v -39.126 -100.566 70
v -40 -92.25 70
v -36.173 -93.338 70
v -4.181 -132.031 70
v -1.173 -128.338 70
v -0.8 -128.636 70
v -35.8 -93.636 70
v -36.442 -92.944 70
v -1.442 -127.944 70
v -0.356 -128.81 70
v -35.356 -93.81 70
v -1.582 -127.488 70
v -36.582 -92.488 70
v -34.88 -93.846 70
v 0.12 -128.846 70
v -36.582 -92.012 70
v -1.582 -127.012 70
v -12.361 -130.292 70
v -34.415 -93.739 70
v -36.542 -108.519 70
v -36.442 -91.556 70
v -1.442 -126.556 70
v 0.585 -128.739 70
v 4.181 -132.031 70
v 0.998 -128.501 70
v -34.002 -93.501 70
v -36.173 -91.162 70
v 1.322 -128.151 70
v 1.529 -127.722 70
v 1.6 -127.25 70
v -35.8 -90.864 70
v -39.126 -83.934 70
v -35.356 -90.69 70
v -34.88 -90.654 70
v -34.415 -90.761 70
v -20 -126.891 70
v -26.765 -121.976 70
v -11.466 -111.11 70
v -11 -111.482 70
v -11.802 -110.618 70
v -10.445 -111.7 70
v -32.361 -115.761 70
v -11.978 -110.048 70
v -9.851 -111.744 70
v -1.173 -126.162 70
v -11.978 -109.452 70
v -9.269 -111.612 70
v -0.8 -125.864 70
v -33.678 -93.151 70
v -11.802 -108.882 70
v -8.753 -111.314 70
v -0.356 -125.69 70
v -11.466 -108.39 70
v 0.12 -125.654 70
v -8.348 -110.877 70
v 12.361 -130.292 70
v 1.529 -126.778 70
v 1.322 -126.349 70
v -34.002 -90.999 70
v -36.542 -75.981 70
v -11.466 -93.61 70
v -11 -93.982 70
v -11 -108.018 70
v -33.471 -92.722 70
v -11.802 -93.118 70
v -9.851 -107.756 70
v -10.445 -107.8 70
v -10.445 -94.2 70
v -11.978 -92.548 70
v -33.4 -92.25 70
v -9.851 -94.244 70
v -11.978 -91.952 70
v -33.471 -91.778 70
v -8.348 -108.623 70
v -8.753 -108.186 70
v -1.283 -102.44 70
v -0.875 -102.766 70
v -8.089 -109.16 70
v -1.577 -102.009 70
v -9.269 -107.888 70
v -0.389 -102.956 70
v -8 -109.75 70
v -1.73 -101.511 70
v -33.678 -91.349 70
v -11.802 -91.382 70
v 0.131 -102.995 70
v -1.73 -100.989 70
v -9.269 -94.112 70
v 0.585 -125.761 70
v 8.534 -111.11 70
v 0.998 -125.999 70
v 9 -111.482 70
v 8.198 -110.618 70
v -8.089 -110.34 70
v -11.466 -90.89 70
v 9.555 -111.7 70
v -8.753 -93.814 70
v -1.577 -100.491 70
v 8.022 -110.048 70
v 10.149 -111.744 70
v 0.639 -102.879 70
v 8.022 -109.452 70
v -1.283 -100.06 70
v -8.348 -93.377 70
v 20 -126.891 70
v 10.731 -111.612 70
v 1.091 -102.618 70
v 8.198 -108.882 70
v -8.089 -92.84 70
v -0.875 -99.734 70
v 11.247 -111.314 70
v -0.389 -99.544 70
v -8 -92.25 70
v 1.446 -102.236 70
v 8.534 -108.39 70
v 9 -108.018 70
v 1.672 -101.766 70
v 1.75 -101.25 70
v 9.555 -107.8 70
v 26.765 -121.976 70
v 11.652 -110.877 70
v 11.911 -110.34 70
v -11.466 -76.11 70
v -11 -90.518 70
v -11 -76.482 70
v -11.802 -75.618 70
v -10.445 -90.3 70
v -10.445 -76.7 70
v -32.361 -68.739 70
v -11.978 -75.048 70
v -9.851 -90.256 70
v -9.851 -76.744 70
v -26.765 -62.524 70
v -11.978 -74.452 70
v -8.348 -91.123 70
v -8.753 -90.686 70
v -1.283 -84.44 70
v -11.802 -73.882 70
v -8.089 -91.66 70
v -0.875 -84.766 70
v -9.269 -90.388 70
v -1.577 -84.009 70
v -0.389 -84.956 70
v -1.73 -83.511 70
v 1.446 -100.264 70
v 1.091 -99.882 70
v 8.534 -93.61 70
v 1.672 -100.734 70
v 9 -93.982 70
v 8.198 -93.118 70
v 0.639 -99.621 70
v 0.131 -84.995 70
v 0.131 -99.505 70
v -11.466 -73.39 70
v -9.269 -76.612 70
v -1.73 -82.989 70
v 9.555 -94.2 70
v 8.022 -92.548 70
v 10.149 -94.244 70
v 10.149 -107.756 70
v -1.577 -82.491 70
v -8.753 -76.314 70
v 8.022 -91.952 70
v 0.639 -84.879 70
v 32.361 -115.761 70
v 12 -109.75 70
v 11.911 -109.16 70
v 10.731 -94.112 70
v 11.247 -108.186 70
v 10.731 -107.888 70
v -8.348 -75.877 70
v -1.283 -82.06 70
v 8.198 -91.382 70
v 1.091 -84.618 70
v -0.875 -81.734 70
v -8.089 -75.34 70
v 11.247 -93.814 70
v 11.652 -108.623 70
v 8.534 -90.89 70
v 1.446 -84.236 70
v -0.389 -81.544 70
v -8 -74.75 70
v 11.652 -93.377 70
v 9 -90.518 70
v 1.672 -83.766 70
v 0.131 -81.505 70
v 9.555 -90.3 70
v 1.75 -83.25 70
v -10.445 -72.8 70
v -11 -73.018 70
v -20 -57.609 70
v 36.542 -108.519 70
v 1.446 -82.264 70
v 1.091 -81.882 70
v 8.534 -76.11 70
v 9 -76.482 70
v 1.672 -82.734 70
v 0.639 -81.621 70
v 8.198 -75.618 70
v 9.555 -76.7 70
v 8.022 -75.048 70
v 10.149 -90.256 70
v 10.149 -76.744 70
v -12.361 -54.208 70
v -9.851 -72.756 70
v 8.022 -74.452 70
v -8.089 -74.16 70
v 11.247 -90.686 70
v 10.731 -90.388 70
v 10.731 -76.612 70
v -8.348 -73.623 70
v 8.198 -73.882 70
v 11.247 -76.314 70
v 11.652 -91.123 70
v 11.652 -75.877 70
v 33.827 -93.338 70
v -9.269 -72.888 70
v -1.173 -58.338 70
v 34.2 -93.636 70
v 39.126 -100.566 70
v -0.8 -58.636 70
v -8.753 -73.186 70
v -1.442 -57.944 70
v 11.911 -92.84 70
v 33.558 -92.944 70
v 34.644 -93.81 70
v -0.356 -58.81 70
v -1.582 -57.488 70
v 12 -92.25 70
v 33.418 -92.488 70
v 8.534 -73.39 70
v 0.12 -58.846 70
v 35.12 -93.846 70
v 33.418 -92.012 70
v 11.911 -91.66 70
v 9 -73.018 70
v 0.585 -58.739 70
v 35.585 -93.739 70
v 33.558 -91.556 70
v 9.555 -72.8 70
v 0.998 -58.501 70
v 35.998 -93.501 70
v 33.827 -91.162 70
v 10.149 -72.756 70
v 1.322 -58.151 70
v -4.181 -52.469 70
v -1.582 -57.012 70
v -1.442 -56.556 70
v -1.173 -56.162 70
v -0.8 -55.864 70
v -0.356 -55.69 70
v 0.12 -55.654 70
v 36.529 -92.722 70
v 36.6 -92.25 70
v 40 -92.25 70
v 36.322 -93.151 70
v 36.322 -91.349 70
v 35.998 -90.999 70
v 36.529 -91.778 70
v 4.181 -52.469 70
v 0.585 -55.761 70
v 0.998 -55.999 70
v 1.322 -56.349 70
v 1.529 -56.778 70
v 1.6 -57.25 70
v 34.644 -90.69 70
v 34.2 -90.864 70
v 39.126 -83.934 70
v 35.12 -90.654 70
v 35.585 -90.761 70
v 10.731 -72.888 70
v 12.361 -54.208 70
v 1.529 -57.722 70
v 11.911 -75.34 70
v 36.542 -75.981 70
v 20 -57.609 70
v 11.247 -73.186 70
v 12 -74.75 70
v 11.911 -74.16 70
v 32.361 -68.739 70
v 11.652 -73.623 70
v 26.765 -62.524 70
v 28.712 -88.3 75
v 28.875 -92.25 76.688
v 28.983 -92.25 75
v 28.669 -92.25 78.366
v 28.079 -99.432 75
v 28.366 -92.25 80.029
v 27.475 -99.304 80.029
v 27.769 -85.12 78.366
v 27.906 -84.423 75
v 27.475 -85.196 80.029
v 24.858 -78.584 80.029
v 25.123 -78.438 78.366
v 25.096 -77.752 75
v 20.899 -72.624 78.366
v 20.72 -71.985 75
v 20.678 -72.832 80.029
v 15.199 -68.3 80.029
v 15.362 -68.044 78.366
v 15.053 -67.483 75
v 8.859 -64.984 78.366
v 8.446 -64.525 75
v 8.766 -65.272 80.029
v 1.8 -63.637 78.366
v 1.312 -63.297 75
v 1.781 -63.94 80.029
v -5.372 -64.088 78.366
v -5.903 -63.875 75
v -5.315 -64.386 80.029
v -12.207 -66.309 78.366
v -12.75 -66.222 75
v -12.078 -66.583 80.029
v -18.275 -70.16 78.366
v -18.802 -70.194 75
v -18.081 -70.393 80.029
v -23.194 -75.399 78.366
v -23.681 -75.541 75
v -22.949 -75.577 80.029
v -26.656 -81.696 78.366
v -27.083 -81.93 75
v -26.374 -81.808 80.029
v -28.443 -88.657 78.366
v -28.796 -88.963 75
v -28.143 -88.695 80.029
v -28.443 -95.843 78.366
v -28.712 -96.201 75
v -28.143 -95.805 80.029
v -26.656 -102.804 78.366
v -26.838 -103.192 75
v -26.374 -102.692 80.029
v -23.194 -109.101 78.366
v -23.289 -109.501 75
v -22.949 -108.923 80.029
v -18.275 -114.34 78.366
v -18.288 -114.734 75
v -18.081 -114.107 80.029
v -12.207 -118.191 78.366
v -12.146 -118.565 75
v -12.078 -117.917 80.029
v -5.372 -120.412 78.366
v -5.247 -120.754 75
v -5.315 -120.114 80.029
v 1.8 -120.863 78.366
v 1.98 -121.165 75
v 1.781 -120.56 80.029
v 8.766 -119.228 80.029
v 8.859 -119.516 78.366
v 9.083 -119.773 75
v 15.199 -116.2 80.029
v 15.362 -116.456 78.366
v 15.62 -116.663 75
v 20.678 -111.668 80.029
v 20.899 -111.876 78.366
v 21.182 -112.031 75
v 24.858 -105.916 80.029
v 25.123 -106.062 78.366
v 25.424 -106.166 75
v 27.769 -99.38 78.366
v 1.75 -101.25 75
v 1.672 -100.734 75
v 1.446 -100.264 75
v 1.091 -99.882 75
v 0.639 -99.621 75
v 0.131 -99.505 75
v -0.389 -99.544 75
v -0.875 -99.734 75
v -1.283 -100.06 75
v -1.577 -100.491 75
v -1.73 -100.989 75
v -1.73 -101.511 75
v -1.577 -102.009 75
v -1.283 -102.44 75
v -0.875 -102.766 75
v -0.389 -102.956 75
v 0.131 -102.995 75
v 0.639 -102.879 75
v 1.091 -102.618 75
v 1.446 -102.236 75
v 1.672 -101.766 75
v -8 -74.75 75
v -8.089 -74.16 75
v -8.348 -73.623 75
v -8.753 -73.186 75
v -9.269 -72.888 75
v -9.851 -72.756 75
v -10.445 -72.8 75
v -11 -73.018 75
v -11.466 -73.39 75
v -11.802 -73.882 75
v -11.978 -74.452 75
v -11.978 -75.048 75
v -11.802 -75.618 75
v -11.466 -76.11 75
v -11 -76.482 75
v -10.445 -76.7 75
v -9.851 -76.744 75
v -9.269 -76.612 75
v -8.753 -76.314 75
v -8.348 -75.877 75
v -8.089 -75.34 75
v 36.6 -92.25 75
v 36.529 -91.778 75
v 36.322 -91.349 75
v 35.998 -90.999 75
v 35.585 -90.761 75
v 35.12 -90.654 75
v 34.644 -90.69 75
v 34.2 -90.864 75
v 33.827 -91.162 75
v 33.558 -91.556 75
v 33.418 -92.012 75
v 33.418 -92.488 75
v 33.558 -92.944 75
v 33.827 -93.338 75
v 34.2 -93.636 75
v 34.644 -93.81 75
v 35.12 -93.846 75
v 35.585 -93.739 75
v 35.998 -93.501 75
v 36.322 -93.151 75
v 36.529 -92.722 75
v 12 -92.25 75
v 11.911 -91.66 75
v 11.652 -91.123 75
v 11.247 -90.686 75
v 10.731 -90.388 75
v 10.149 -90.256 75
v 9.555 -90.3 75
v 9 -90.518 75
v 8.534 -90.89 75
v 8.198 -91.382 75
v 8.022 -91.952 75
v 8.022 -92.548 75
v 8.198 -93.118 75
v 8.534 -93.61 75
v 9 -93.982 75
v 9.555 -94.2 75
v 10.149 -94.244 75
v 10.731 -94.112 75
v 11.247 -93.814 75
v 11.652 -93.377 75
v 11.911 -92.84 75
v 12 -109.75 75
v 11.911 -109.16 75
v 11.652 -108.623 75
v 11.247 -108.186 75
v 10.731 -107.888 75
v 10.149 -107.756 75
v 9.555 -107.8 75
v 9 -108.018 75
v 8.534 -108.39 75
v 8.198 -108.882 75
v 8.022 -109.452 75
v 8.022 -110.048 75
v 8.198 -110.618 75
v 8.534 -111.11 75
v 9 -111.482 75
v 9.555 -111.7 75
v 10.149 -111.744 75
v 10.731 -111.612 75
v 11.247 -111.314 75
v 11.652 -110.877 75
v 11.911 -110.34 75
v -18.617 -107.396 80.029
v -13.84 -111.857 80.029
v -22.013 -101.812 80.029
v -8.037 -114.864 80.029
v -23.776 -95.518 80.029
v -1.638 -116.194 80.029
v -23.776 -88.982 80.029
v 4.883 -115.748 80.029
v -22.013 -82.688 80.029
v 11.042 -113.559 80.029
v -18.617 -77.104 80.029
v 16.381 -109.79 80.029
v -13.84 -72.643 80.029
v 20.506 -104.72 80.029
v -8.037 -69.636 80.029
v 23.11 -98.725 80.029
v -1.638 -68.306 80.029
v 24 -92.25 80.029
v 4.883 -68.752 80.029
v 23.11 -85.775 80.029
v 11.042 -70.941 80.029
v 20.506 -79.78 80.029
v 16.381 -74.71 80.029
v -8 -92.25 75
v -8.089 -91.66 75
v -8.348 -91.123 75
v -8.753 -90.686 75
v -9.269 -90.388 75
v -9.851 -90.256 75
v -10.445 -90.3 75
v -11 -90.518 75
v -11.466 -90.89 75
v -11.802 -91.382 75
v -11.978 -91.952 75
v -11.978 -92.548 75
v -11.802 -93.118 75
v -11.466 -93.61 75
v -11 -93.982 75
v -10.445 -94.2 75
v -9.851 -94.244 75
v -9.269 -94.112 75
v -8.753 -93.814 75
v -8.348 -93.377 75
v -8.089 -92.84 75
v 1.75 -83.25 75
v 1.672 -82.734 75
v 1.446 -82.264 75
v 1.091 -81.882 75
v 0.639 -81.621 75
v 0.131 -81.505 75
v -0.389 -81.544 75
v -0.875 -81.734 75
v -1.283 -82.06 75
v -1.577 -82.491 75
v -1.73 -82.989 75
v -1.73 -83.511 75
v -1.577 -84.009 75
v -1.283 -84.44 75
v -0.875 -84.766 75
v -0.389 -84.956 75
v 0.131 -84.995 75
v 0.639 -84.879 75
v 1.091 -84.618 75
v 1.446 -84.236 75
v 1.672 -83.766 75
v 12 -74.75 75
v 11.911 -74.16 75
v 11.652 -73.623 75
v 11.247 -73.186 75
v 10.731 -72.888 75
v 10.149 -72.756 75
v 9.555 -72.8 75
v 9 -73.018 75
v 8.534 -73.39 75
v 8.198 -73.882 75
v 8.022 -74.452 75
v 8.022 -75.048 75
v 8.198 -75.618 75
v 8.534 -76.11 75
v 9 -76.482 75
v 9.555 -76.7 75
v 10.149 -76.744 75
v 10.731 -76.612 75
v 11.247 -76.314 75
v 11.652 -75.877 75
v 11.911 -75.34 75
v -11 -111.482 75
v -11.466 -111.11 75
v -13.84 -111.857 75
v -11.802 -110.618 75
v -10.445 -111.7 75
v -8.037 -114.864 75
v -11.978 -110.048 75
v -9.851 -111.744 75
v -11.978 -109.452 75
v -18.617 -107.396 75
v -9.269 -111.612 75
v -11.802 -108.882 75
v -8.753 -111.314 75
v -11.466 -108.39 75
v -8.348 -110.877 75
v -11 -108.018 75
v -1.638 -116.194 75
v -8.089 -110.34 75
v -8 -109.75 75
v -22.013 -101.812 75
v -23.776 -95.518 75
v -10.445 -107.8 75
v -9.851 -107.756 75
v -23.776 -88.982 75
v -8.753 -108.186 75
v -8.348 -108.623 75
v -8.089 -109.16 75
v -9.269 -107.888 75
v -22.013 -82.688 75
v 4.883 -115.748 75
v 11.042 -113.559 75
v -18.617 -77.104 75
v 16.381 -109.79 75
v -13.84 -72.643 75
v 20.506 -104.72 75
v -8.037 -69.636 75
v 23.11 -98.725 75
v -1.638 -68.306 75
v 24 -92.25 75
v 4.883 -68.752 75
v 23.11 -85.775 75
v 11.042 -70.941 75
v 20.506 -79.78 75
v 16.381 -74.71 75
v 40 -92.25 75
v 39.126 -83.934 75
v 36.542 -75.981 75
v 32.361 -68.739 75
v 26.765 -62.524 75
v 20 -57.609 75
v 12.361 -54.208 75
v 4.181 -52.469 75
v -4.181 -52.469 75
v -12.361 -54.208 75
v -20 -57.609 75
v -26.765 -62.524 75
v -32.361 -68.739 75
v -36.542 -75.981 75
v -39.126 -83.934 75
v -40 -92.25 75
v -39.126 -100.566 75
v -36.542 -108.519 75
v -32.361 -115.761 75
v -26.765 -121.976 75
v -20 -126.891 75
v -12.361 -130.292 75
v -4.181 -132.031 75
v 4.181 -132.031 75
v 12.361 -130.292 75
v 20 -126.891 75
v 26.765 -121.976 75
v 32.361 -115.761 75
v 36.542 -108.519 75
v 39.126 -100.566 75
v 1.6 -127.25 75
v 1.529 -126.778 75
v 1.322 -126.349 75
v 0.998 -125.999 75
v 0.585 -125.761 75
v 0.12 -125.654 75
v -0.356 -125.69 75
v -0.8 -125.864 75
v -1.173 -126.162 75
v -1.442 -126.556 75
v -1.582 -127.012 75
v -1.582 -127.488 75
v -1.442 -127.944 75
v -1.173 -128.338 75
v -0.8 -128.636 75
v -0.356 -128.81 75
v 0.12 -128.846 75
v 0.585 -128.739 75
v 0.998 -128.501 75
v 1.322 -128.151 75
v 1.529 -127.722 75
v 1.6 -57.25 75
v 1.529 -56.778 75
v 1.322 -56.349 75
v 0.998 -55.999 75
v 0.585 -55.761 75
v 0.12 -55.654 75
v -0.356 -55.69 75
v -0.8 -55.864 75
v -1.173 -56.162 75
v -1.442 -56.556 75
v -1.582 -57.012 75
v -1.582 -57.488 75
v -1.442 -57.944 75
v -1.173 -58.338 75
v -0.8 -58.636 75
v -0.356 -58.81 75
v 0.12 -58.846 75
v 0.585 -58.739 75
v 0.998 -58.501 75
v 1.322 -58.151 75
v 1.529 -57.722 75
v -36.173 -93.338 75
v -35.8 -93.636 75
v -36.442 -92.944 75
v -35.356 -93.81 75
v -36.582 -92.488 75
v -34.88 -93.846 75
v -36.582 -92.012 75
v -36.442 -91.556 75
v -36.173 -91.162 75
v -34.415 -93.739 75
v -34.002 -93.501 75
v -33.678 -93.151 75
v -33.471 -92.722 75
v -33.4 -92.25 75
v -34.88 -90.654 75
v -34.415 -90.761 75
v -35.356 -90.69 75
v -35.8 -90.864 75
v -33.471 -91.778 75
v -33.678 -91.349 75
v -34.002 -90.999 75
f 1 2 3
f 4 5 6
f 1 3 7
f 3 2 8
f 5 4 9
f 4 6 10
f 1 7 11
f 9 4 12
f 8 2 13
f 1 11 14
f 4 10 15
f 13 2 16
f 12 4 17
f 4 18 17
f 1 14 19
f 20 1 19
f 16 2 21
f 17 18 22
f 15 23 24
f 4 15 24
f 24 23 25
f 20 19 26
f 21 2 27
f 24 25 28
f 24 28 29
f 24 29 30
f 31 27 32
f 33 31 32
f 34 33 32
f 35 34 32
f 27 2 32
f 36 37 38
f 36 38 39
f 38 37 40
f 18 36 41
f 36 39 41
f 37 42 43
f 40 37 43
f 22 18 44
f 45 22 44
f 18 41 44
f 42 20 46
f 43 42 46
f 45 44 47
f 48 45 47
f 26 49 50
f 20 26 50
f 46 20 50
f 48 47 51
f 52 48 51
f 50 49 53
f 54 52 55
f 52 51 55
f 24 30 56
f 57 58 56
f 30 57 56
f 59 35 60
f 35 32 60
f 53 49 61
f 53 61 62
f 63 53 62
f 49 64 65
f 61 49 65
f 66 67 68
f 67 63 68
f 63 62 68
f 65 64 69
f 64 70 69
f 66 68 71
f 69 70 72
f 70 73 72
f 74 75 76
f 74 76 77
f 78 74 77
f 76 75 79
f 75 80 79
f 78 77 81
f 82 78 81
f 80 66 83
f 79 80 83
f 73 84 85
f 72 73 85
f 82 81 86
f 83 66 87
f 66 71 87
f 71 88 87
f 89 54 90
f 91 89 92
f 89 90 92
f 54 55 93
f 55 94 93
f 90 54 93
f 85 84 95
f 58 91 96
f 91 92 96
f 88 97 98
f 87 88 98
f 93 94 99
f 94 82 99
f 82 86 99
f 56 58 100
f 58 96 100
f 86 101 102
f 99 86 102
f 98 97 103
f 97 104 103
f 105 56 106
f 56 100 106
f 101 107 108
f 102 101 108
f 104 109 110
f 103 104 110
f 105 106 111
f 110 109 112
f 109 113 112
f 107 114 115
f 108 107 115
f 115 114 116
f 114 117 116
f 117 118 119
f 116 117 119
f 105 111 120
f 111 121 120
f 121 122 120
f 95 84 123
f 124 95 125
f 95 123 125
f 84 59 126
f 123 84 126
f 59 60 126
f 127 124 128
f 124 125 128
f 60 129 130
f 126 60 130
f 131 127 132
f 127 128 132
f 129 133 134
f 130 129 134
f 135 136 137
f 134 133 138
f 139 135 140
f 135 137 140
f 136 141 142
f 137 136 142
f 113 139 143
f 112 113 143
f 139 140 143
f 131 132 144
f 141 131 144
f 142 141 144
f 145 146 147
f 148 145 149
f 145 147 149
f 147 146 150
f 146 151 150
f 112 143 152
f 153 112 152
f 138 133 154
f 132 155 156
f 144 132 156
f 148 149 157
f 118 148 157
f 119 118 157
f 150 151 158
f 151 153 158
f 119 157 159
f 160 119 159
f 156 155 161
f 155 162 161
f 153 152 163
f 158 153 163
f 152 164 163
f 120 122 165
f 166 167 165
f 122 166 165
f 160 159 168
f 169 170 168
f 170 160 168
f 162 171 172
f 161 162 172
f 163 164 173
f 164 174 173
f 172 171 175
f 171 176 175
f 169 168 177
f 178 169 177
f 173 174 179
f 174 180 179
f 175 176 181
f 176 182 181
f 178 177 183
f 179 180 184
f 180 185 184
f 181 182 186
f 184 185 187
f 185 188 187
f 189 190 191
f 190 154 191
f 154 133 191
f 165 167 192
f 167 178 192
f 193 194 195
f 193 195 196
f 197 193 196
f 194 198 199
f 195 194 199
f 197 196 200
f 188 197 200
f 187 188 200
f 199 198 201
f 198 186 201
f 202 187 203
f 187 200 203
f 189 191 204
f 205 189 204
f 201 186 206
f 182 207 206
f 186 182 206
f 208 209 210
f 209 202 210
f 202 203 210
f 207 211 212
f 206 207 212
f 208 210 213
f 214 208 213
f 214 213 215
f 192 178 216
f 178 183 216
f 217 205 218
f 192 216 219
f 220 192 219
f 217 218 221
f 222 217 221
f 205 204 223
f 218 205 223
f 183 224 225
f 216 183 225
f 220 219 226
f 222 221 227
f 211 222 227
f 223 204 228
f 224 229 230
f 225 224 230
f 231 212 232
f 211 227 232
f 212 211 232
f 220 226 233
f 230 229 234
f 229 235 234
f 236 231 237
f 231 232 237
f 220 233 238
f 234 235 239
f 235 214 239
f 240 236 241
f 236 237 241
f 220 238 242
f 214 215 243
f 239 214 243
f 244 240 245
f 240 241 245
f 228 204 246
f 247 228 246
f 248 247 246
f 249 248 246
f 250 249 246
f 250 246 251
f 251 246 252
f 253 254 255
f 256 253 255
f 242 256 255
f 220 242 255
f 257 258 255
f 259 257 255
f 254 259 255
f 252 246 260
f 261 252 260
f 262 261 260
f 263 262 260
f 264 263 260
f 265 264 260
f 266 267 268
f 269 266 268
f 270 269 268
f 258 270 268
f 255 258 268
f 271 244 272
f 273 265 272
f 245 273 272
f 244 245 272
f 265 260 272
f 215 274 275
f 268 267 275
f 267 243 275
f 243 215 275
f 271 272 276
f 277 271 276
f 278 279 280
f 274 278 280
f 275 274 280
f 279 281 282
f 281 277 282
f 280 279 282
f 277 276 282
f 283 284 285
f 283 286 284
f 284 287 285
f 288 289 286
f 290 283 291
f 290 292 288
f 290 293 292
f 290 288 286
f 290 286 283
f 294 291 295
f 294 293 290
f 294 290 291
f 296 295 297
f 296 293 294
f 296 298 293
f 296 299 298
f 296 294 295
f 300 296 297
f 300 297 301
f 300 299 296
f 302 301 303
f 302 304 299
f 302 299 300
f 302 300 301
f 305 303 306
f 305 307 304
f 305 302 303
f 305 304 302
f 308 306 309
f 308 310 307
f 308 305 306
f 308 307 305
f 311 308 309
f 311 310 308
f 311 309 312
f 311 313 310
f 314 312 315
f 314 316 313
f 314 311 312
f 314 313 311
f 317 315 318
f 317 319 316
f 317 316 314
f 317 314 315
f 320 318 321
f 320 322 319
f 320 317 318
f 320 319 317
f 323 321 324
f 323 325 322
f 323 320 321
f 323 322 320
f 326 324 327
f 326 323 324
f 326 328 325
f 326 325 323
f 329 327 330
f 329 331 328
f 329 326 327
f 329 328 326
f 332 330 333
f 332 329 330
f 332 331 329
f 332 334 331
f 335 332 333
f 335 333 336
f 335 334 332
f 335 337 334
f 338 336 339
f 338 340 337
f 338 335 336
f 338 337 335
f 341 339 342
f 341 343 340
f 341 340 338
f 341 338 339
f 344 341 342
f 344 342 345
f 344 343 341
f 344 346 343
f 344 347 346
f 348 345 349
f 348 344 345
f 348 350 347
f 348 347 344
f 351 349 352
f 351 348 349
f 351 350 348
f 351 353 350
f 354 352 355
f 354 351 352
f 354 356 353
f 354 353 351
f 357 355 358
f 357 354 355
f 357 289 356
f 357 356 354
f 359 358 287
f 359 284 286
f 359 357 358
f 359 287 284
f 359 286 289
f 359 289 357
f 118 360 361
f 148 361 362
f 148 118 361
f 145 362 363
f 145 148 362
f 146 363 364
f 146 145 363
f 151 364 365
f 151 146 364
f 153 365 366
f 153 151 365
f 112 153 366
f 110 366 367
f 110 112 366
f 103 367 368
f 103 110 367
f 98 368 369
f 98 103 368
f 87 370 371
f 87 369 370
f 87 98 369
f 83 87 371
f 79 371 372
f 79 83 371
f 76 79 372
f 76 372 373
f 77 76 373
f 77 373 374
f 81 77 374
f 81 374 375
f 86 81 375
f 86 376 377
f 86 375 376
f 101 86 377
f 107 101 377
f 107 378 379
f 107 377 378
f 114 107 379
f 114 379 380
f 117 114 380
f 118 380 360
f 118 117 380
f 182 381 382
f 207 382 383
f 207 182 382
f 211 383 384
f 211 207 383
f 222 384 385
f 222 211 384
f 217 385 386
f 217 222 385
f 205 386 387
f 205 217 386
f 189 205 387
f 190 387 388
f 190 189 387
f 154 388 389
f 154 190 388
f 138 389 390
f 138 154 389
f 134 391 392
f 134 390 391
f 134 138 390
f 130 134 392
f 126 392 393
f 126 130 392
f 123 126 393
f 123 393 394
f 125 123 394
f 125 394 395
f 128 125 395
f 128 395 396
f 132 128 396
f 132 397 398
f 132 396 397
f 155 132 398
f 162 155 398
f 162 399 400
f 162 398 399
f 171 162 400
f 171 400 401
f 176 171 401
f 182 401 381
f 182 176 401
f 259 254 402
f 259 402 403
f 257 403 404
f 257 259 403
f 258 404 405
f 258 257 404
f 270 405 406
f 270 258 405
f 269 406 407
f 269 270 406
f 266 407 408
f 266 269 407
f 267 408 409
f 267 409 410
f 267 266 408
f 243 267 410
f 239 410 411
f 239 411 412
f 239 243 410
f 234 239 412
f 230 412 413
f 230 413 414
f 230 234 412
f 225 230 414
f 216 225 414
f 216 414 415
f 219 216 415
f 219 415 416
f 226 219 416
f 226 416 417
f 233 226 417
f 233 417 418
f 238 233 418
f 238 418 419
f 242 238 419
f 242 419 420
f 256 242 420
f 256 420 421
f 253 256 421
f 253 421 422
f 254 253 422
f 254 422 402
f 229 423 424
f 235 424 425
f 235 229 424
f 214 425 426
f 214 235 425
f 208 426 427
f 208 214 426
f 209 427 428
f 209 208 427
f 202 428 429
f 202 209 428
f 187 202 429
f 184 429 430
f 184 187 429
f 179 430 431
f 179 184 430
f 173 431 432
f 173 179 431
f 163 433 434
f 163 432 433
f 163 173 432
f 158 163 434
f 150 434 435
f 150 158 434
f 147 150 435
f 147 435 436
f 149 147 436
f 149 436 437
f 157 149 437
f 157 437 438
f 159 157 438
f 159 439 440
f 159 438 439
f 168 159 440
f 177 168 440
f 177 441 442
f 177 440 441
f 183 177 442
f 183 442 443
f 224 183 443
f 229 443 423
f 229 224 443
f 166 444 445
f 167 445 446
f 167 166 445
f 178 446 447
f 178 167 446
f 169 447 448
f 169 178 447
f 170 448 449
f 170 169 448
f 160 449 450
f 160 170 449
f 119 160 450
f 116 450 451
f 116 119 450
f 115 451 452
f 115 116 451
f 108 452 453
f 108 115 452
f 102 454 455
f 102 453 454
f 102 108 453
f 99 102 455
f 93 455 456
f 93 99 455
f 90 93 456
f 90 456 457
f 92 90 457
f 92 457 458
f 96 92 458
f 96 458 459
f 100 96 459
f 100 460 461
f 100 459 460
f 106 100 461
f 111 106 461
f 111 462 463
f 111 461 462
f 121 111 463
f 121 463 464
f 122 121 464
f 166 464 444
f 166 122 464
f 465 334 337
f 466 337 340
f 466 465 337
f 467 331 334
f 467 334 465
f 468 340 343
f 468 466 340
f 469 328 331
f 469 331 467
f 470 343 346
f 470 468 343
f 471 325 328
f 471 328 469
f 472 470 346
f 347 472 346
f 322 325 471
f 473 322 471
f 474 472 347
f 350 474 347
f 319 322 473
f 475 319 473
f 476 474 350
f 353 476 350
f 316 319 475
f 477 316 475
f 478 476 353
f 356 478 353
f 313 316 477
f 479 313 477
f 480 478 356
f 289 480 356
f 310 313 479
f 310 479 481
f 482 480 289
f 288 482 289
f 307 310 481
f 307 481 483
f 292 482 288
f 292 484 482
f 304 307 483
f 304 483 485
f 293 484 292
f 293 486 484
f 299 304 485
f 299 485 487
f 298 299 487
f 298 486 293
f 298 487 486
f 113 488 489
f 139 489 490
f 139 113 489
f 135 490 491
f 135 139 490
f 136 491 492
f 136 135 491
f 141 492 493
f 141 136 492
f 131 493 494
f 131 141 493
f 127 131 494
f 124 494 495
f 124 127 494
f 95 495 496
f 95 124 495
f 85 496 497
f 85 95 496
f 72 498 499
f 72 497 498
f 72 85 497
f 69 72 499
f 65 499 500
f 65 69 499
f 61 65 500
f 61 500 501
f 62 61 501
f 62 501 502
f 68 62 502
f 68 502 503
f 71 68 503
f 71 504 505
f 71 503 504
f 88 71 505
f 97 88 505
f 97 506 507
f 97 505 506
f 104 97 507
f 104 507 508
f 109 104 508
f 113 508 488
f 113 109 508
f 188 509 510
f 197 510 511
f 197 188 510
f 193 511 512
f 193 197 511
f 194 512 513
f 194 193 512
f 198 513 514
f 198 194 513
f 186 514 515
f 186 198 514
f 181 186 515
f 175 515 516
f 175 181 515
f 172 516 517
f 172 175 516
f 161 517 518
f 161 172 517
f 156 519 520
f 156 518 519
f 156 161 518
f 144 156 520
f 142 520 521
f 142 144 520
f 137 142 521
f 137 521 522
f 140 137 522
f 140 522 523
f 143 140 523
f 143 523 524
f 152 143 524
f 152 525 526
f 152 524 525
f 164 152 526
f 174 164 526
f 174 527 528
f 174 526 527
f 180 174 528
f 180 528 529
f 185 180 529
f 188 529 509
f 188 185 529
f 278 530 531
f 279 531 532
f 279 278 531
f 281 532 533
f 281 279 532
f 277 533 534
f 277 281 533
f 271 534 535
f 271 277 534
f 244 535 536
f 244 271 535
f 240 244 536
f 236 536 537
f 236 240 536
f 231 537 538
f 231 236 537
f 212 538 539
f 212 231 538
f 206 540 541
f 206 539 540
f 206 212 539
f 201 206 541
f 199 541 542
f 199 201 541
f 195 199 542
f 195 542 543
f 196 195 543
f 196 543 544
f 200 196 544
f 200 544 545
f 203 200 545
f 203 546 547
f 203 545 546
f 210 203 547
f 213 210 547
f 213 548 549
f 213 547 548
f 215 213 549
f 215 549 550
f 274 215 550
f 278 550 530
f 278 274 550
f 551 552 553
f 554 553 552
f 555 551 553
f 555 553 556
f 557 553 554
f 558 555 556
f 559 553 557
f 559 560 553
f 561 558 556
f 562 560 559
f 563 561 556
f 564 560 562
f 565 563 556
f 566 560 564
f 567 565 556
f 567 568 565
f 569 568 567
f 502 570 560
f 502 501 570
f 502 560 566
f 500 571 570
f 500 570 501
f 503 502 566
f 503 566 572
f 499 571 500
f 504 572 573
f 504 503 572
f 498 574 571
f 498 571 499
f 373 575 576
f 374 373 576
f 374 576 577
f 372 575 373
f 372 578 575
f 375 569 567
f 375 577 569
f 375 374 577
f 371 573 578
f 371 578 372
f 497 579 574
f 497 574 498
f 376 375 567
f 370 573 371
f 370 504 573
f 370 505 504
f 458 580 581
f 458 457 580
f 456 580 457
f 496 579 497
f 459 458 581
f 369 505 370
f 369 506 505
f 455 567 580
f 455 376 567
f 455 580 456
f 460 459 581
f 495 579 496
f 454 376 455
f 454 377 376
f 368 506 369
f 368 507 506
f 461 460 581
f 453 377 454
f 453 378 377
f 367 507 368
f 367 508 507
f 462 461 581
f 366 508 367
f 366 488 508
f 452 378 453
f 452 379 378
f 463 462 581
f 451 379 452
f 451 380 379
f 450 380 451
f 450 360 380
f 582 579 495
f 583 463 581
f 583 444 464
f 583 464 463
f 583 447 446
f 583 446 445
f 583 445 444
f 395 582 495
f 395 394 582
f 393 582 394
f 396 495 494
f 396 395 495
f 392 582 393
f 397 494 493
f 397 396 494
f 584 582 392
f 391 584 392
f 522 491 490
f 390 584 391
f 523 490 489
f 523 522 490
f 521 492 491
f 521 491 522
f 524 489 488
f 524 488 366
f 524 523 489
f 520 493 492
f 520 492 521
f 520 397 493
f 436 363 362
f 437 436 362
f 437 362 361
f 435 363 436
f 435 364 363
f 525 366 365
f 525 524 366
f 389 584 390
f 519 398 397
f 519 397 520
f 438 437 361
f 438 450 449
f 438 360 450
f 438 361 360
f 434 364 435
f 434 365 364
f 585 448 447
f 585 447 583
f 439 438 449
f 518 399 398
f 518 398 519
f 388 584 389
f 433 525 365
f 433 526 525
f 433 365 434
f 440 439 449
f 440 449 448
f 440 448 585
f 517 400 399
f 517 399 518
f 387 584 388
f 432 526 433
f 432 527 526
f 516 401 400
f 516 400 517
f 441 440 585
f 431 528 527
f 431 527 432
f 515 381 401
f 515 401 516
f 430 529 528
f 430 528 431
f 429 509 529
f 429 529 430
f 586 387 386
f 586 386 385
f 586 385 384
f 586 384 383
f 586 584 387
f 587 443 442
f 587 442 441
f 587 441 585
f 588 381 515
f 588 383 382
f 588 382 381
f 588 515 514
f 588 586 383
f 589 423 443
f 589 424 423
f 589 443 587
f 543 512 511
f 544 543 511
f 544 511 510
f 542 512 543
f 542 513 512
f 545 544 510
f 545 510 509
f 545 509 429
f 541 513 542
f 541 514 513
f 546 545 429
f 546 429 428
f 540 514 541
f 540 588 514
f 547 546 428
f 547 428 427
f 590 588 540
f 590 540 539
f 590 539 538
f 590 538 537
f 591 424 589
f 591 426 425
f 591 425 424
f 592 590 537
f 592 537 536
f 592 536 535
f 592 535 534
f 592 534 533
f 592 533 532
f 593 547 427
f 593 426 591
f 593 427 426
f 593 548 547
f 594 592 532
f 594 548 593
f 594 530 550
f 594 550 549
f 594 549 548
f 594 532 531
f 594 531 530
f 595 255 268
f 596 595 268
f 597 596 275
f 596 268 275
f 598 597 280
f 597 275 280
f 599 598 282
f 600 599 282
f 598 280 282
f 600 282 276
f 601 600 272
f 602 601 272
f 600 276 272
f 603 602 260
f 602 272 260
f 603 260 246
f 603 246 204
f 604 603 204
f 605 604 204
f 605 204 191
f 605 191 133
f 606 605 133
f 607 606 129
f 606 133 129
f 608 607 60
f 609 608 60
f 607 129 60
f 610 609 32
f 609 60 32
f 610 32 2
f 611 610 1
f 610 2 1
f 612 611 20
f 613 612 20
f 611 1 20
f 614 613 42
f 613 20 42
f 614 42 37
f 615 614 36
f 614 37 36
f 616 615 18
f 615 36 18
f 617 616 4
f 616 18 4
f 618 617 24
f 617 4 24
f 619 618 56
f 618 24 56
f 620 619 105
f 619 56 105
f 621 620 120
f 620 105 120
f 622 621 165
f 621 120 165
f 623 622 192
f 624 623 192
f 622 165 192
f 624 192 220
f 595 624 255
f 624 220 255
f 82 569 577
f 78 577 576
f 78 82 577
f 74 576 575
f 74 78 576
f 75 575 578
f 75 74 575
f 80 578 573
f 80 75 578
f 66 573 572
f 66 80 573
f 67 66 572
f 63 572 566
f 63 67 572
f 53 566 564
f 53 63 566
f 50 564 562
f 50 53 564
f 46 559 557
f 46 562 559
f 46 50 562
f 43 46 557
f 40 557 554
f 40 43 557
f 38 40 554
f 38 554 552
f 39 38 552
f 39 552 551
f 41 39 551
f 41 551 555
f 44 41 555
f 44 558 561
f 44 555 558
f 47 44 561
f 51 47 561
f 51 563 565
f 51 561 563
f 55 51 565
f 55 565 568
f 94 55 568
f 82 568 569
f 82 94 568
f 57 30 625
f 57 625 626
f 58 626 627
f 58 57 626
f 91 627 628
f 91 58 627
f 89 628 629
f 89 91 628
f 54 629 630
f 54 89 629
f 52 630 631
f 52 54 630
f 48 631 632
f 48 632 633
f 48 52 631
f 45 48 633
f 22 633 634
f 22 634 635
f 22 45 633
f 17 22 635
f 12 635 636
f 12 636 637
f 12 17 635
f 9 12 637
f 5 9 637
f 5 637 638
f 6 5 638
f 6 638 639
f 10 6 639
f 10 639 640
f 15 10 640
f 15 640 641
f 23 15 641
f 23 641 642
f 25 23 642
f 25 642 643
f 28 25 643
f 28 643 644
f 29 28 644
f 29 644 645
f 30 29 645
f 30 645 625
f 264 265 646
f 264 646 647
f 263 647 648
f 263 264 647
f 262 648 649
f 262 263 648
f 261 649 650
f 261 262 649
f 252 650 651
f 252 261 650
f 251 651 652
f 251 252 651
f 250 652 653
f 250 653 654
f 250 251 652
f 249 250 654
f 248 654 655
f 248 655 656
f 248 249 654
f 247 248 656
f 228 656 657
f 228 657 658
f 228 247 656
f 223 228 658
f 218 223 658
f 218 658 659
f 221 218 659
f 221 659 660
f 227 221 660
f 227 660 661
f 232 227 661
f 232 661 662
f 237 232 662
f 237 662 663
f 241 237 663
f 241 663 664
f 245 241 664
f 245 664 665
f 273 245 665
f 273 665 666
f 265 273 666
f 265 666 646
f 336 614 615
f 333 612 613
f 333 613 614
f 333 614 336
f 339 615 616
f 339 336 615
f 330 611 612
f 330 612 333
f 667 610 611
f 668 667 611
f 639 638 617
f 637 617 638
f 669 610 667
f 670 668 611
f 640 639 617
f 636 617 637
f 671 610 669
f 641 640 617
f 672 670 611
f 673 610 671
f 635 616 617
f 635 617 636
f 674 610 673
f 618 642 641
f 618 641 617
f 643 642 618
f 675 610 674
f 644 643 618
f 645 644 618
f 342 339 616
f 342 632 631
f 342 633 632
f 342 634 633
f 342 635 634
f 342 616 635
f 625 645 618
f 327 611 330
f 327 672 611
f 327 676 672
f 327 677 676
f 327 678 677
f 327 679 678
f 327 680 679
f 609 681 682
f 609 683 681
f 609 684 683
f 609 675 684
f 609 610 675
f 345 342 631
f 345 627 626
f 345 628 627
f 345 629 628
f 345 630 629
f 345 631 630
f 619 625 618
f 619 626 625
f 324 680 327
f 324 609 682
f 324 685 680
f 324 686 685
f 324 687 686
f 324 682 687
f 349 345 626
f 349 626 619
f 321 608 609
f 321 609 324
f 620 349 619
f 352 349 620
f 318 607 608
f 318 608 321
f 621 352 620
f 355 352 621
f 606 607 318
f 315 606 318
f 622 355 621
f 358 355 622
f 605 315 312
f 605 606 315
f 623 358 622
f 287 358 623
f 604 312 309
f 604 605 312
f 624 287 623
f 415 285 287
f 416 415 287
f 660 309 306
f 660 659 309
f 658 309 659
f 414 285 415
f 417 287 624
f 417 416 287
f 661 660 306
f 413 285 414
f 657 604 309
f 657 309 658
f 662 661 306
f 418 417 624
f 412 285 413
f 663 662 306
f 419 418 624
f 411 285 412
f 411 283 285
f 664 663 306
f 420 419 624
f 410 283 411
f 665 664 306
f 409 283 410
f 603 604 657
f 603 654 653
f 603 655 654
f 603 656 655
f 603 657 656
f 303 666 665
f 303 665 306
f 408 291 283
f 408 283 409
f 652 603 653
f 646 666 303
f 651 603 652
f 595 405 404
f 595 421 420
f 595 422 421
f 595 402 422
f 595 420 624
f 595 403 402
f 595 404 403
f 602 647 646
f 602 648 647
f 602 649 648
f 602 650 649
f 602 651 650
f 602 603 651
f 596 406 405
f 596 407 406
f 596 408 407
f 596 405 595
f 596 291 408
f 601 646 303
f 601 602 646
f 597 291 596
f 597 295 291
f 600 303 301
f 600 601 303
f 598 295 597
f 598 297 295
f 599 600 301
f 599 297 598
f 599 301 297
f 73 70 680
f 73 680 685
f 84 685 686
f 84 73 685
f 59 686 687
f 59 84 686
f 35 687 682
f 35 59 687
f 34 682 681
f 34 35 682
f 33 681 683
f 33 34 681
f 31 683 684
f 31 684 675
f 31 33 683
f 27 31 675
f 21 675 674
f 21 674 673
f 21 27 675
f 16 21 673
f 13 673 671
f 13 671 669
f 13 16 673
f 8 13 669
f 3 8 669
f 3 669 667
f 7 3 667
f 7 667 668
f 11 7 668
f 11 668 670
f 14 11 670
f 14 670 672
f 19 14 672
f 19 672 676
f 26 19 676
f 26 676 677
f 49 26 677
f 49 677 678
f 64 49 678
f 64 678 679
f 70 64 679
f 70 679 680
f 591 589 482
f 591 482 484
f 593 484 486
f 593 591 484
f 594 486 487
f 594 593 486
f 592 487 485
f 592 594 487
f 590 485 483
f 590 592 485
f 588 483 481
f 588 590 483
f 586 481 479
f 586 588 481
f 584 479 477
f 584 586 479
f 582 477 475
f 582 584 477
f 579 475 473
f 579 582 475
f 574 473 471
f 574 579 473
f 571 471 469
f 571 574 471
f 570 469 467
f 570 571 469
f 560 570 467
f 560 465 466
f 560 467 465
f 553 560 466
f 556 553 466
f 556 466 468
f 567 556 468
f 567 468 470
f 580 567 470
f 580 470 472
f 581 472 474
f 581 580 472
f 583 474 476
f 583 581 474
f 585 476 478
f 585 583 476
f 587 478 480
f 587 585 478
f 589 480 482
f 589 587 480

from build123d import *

# Parameters (mm, degrees)
CYLINDER089_R     = 1.6
CYLINDER089_DEPTH = 10
CYLINDER090_R     = 1.6
CYLINDER090_DEPTH = 10
CYLINDER091_R     = 1.6
CYLINDER091_DEPTH = 10
CYLINDER088_R     = 1.6
CYLINDER088_DEPTH = 10
CYLINDER085_R     = 2
CYLINDER085_DEPTH = 10
CYLINDER084_R     = 2
CYLINDER084_DEPTH = 10
CYLINDER087_R     = 1.75
CYLINDER087_DEPTH = 10
CYLINDER086_R     = 1.75
CYLINDER086_DEPTH = 10
CYLINDER078_R     = 2
CYLINDER078_DEPTH = 10
CYLINDER079_R     = 2
CYLINDER079_DEPTH = 10
CYLINDER080_R     = 2
CYLINDER080_DEPTH = 10
CYLINDER081_R     = 2
CYLINDER081_DEPTH = 10
CYLINDER083_R     = 24
CYLINDER083_DEPTH = 7
CYLINDER082_R     = 40
CYLINDER082_DEPTH = 5


with BuildPart() as m2heatsetinsets017:
    # Cylinder089 → Cylinder089 (new body)
    with BuildSketch(Plane(origin=(40, 0, 65), x_dir=(1, 0, 0), z_dir=(0, 0, 1))):
        Circle(CYLINDER089_R)
    extrude(amount=CYLINDER089_DEPTH)


with BuildPart() as m2heatsetinsets018:
    # Cylinder090 → Cylinder090 (new body)
    with BuildSketch(Plane(origin=(5, 35, 65), x_dir=(1, 0, 0), z_dir=(0, 0, 1))):
        Circle(CYLINDER090_R)
    extrude(amount=CYLINDER090_DEPTH)


with BuildPart() as m2heatsetinsets019:
    # Cylinder091 → Cylinder091 (new body)
    with BuildSketch(Plane(origin=(5, -35, 65), x_dir=(1, 0, 0), z_dir=(0, 0, 1))):
        Circle(CYLINDER091_R)
    extrude(amount=CYLINDER091_DEPTH)


with BuildPart() as fusion045:
    # Cylinder088 → Cylinder088 (new body)
    with BuildSketch(Plane(origin=(-30, 0, 65), x_dir=(1, 0, 0), z_dir=(0, 0, 1))):
        Circle(CYLINDER088_R)
    extrude(amount=CYLINDER088_DEPTH)

    # Fusion045: union m2HeatSetInsets017, m2HeatSetInsets018, m2HeatSetInsets019
    add(m2heatsetinsets017.part)
    add(m2heatsetinsets018.part)
    add(m2heatsetinsets019.part)


with BuildPart() as wirecut009:
    # Cylinder085 → Cylinder085 (new body)
    with BuildSketch(Plane(origin=(15, 0, 70), x_dir=(1, 0, 0), z_dir=(0, 0, 1))):
        Circle(CYLINDER085_R)
    extrude(amount=CYLINDER085_DEPTH)


with BuildPart() as wirecuts004:
    # Cylinder084 → Cylinder084 (new body)
    with BuildSketch(Plane(origin=(-5, 0, 70), x_dir=(1, 0, 0), z_dir=(0, 0, 1))):
        Circle(CYLINDER084_R)
    extrude(amount=CYLINDER084_DEPTH)

    # Fusion041: union wireCUt009
    add(wirecut009.part)


with BuildPart() as m3cuts009:
    # Cylinder087 → Cylinder087 (new body)
    with BuildSketch(Plane(origin=(5, 9, 70), x_dir=(1, 0, 0), z_dir=(0, 0, 1))):
        Circle(CYLINDER087_R)
    extrude(amount=CYLINDER087_DEPTH)


with BuildPart() as m3cute004:
    # Cylinder086 → Cylinder086 (new body)
    with BuildSketch(Plane(origin=(5, -9, 70), x_dir=(1, 0, 0), z_dir=(0, 0, 1))):
        Circle(CYLINDER086_R)
    extrude(amount=CYLINDER086_DEPTH)

    # Fusion042: union m3Cuts009
    add(m3cuts009.part)


with BuildPart() as cylinder078:
    # Cylinder078 → Cylinder078 (new body)
    with BuildSketch(Plane(origin=(0, -21, 0), x_dir=(1, 0, 0), z_dir=(0, 0, 1))):
        Circle(CYLINDER078_R)
    extrude(amount=CYLINDER078_DEPTH)


with BuildPart() as m3heatsetcuts012:
    # Cylinder079 → Cylinder079 (new body)
    with BuildSketch(Plane(origin=(20, -21, 0), x_dir=(1, 0, 0), z_dir=(0, 0, 1))):
        Circle(CYLINDER079_R)
    extrude(amount=CYLINDER079_DEPTH)

    # Fusion038: union Cylinder078
    add(cylinder078.part)


with BuildPart() as m3heatsetcuts012_1:
    # Fusion038 placement: moved
    add(m3heatsetcuts012.part.moved(Location((-5, 38.5, 70))))


with BuildPart() as cylinder080:
    # Cylinder080 → Cylinder080 (new body)
    with BuildSketch(Plane(origin=(0, -21, 0), x_dir=(1, 0, 0), z_dir=(0, 0, 1))):
        Circle(CYLINDER080_R)
    extrude(amount=CYLINDER080_DEPTH)


with BuildPart() as basecuts004:
    # Cylinder081 → Cylinder081 (new body)
    with BuildSketch(Plane(origin=(20, -21, 0), x_dir=(1, 0, 0), z_dir=(0, 0, 1))):
        Circle(CYLINDER081_R)
    extrude(amount=CYLINDER081_DEPTH)

    # Fusion039: union Cylinder080
    add(cylinder080.part)


with BuildPart() as basecuts004_1:
    # Fusion039 placement: moved
    add(basecuts004.part.moved(Location((-5, 3.5, 70))))

    # Fusion040: union m3HeatSetCuts012
    add(m3heatsetcuts012_1.part)

    # Fusion043: union wireCuts004, m3Cute004
    add(wirecuts004.part)
    add(m3cute004.part)


with BuildPart() as basecut004:
    # Cylinder083 → Cylinder083 (new body)
    with BuildSketch(Plane(origin=(5, 0, 74), x_dir=(1, 0, 0), z_dir=(0, 0, 1))):
        Circle(CYLINDER083_R)
    extrude(amount=CYLINDER083_DEPTH)


with BuildPart() as cut015:
    # Sphere005 → Sphere005 (revolve)
    with BuildSketch(Plane(origin=(5, 0, 74), x_dir=(1, 0, 0), z_dir=(0, -1, 0))):
        with BuildLine():
            ThreePointArc((29, 0), (28.841135, 3.031325), (28.36628, 6.029439))
            Line((28.36628, 6.029439), (0, 6.029439))
            Line((0, 6.029439), (0, 0))
            Line((0, 0), (29, 0))
        make_face()
    revolve(axis=Axis((5, 0, 74), (0, 0, 1)))

    # Cut015: cut baseCut004
    add(basecut004.part, mode=Mode.SUBTRACT)


with BuildPart() as lightmodule004:
    # Cylinder082 → Cylinder082 (new body)
    with BuildSketch(Plane(origin=(5, 0, 70), x_dir=(1, 0, 0), z_dir=(0, 0, 1))):
        Circle(CYLINDER082_R)
    extrude(amount=CYLINDER082_DEPTH)

    # Fusion044: union Cut015
    add(cut015.part)

    # Cut016: cut baseCUts004
    add(basecuts004_1.part, mode=Mode.SUBTRACT)

    # Cut017: cut Fusion045
    add(fusion045.part, mode=Mode.SUBTRACT)


with BuildPart() as lightmodule004_1:
    # Cut017 placement: moved
    add(lightmodule004.part.moved(Location((-5, -92.25, 0))))


solid = lightmodule004_1.part
